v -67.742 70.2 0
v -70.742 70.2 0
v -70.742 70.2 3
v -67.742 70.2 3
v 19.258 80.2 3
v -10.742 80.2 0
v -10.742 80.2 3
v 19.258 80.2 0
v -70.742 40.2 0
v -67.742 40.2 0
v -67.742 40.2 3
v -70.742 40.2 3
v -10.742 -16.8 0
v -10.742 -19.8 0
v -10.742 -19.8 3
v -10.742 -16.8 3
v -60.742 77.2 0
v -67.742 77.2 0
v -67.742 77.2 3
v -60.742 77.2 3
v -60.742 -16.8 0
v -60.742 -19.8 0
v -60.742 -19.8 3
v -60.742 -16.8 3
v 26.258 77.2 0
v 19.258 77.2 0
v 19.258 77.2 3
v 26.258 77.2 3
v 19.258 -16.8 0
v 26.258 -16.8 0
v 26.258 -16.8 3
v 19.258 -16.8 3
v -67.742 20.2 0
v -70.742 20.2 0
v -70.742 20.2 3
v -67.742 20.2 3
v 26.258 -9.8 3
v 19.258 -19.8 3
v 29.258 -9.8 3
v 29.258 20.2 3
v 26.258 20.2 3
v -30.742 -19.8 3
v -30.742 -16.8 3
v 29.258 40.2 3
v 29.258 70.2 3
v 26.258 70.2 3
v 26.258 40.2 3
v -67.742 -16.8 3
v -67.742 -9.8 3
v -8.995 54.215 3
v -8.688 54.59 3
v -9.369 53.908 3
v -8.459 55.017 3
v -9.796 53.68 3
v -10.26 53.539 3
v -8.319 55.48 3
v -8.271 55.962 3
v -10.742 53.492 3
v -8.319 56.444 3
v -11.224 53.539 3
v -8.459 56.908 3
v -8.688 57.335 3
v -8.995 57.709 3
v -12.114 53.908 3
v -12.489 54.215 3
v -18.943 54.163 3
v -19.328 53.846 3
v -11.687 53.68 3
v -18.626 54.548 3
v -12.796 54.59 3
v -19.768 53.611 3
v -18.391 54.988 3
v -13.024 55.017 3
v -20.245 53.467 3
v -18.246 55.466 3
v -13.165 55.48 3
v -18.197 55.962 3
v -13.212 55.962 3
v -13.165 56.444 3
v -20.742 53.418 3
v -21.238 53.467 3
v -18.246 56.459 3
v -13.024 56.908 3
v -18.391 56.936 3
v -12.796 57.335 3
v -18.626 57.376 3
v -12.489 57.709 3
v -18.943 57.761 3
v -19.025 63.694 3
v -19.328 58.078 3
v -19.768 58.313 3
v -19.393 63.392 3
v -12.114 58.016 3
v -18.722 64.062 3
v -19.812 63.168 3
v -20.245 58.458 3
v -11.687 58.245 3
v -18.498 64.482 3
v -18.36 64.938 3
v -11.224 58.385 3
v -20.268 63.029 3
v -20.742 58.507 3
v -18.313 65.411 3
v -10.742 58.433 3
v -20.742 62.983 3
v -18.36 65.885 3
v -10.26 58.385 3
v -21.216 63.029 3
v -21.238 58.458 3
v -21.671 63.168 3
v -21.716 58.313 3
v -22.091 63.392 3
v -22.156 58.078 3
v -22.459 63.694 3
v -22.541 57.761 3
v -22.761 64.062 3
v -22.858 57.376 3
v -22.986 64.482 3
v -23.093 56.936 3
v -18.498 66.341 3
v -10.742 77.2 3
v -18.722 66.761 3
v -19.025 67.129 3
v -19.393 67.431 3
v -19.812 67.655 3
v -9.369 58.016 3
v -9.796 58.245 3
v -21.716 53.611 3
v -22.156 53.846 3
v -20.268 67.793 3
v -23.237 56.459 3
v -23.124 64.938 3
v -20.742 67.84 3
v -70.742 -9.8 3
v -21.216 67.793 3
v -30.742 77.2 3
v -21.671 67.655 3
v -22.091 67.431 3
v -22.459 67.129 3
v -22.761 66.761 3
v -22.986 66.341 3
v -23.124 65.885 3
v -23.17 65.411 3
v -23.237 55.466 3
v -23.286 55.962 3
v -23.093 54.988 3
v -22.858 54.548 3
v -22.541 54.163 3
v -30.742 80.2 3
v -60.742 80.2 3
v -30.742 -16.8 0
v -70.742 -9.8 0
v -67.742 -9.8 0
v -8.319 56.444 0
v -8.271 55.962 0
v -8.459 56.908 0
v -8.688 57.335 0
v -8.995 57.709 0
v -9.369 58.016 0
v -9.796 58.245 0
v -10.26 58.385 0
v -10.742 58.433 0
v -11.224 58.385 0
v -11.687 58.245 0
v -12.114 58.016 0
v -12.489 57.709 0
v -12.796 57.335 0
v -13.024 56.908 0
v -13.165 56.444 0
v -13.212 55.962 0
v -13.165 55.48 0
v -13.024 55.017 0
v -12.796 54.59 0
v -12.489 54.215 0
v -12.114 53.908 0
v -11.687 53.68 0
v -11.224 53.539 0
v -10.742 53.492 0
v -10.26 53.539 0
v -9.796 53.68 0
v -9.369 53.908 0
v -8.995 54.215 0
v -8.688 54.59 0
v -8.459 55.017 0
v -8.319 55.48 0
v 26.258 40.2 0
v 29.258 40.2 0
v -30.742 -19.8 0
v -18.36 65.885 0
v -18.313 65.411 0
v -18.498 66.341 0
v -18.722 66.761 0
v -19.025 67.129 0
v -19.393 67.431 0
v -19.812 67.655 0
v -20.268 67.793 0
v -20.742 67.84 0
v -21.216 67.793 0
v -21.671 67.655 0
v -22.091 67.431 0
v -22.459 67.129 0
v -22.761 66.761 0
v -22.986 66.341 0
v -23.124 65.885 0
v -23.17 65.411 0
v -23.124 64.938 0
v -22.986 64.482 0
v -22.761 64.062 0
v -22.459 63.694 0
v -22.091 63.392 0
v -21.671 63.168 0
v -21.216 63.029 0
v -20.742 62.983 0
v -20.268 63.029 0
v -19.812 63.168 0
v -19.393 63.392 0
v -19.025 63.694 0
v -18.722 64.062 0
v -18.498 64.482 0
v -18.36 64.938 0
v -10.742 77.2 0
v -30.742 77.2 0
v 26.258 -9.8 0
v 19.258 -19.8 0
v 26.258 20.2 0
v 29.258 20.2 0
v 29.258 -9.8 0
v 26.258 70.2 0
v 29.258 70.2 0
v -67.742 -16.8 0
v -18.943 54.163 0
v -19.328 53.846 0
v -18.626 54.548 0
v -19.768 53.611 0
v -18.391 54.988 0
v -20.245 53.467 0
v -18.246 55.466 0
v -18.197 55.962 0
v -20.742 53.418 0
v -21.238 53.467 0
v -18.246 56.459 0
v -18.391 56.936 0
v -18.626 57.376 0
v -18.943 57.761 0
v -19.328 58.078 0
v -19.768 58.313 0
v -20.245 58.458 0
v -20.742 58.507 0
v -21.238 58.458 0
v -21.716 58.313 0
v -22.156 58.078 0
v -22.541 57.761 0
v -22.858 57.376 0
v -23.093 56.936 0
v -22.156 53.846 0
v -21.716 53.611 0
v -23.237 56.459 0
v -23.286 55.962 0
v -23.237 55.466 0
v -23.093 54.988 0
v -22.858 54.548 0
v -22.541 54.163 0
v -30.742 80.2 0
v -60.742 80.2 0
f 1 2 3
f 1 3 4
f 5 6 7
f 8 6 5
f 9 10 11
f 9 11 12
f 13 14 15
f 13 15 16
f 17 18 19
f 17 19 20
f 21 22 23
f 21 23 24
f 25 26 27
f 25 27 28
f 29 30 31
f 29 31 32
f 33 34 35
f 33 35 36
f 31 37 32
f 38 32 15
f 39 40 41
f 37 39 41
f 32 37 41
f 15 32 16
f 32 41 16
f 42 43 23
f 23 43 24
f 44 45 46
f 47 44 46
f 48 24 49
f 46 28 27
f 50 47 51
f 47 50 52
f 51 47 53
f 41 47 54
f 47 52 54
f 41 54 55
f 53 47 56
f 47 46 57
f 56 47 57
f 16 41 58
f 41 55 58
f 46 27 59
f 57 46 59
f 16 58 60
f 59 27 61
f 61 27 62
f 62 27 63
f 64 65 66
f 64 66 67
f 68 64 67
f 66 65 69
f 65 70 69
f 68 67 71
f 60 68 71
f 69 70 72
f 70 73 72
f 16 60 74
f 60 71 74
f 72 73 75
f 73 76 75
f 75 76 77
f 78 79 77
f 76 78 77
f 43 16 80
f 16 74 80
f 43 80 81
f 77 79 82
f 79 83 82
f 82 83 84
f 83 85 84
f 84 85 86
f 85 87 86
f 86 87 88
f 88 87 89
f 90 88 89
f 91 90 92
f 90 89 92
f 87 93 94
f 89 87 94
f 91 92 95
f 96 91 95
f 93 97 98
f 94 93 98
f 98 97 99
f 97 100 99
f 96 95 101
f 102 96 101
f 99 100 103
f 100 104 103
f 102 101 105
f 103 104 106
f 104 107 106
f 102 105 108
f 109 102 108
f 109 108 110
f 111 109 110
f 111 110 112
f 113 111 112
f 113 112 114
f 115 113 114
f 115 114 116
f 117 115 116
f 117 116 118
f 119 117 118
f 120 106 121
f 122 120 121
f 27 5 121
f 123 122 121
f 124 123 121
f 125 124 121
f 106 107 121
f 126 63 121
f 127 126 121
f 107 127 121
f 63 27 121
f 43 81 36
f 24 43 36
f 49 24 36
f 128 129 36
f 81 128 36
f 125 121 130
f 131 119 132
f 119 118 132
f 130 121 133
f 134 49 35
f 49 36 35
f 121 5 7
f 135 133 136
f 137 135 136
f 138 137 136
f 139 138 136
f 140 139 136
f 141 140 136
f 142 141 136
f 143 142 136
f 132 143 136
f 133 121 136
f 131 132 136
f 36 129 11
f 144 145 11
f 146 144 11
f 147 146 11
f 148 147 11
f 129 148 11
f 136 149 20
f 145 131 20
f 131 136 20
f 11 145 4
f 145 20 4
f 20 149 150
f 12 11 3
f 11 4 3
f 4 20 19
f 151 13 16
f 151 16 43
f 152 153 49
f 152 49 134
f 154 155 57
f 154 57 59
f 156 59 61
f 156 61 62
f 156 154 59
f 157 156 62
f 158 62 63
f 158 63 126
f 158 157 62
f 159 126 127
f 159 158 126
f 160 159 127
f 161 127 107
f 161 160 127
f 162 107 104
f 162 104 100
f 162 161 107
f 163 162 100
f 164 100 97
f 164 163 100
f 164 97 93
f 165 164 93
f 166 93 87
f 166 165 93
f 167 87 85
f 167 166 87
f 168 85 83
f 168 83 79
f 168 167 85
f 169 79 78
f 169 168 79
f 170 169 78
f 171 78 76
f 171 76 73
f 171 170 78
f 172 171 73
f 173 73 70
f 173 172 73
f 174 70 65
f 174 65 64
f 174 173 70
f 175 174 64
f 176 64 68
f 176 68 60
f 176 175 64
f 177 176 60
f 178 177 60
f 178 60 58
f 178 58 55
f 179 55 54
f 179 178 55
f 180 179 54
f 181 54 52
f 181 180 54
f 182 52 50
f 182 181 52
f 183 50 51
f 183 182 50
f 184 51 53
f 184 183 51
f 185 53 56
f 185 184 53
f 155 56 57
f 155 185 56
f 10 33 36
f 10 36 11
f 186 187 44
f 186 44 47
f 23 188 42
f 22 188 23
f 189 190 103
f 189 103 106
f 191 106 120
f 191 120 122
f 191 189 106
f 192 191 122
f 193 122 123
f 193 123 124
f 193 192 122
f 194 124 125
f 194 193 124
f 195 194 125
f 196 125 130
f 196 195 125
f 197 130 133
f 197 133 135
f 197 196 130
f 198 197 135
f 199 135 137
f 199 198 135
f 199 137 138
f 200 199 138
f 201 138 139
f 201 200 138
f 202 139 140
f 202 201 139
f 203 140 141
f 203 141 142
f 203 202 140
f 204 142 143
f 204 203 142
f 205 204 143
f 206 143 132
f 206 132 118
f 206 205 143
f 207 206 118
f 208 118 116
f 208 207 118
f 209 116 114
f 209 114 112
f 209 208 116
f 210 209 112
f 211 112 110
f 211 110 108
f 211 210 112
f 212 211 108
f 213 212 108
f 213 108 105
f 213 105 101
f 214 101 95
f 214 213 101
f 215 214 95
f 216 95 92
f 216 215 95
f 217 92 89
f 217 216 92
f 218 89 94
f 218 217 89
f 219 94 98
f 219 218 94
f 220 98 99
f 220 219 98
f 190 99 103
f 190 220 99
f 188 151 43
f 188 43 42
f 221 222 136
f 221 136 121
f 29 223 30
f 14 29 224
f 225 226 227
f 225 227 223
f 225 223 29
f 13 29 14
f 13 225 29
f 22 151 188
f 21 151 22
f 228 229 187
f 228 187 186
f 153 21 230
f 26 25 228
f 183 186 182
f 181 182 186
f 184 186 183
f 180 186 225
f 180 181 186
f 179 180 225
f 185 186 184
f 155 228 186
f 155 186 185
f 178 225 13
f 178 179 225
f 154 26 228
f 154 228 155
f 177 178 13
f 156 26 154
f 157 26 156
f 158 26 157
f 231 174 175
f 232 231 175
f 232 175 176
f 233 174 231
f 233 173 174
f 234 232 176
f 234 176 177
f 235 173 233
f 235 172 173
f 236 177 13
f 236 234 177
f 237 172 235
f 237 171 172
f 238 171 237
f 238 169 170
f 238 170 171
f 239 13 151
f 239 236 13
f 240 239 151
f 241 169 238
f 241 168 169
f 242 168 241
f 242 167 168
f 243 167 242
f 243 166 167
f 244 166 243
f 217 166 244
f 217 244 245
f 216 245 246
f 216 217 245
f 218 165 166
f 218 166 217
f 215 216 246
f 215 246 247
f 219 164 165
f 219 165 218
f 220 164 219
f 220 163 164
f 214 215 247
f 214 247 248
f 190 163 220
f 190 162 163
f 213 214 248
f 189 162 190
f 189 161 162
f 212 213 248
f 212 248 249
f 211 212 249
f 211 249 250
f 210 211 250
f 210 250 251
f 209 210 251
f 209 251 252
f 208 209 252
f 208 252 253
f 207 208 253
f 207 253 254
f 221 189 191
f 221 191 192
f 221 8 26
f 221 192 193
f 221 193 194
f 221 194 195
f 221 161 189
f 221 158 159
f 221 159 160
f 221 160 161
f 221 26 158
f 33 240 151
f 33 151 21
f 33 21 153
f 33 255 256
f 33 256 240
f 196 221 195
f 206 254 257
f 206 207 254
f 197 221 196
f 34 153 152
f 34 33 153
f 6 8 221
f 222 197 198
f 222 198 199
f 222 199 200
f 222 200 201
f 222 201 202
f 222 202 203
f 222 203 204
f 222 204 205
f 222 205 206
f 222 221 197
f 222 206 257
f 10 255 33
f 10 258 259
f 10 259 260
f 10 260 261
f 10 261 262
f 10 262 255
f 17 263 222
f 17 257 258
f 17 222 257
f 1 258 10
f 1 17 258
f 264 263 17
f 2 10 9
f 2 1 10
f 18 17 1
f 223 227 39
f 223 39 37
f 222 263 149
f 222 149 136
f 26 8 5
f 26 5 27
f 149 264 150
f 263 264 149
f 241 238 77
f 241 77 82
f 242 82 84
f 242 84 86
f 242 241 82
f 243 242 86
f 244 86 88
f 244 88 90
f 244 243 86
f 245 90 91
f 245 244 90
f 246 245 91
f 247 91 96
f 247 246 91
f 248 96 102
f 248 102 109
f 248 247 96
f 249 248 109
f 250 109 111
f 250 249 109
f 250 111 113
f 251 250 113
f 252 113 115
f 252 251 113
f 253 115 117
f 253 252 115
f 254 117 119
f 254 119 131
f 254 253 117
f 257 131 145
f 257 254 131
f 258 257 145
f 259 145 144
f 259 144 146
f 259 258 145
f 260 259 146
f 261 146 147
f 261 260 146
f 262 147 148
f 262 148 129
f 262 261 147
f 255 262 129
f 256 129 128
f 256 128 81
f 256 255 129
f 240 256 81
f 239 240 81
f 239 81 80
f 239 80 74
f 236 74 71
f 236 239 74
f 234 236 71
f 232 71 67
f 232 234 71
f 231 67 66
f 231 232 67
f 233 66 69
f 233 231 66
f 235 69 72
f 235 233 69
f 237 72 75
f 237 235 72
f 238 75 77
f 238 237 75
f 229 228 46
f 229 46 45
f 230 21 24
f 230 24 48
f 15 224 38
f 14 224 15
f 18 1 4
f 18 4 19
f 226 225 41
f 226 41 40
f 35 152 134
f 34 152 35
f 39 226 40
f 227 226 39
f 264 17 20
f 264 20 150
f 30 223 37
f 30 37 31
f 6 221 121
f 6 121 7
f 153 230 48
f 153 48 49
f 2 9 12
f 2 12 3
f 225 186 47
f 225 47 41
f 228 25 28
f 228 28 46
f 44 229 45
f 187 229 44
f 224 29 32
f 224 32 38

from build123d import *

# Parameters (mm, degrees)
ESQUISSE1_R        = 2.544536974
ESQUISSE1_R_2      = 2.470557968
ESQUISSE1_R_3      = 2.428661445
BOSS_EXTRU_1_DEPTH = 3


with BuildPart() as part:
    # Esquisse1 → Boss.-Extru.1 (new body)
    with BuildSketch(Plane.XY):
        Polygon((19.258166425, 80.200130208), (-10.741833575, 80.200130208), (-10.741833575, 77.200130208), (-30.741833575, 77.200130208), (-30.741833575, 80.200130208), (-60.741833575, 80.200130208), (-60.741833575, 77.200130208), (-67.741833575, 77.200130208), (-67.741833575, 70.200130208), (-70.741833575, 70.200130208), (-70.741833575, 40.200130208), (-67.741833575, 40.200130208), (-67.741833575, 20.200130208), (-70.741833575, 20.200130208), (-70.741833575, -9.799869792), (-67.741833575, -9.799869792), (-67.741833575, -16.799869792), (-60.741833575, -16.799869792), (-60.741833575, -19.799869792), (-30.741833575, -19.799869792), (-30.741833575, -16.799869792), (-10.741833575, -16.799869792), (-10.741833575, -19.799869792), (19.258166425, -19.799869792), (19.258166425, -16.799869792), (26.258166425, -16.799869792), (26.258166425, -9.799869792), (29.258166425, -9.799869792), (29.258166425, 20.200130208), (26.258166425, 20.200130208), (26.258166425, 40.200130208), (29.258166425, 40.200130208), (29.258166425, 70.200130208), (26.258166425, 70.200130208), (26.258166425, 77.200130208), (19.258166425, 77.200130208), align=None)
        with Locations((-20.741833575, 55.962168499)):
            Circle(ESQUISSE1_R, mode=Mode.SUBTRACT)
        with Locations((-10.741833575, 55.962168499)):
            Circle(ESQUISSE1_R_2, mode=Mode.SUBTRACT)
        with Locations((-20.741833575, 65.411454145)):
            Circle(ESQUISSE1_R_3, mode=Mode.SUBTRACT)
    extrude(amount=BOSS_EXTRU_1_DEPTH)


solid = part.part
